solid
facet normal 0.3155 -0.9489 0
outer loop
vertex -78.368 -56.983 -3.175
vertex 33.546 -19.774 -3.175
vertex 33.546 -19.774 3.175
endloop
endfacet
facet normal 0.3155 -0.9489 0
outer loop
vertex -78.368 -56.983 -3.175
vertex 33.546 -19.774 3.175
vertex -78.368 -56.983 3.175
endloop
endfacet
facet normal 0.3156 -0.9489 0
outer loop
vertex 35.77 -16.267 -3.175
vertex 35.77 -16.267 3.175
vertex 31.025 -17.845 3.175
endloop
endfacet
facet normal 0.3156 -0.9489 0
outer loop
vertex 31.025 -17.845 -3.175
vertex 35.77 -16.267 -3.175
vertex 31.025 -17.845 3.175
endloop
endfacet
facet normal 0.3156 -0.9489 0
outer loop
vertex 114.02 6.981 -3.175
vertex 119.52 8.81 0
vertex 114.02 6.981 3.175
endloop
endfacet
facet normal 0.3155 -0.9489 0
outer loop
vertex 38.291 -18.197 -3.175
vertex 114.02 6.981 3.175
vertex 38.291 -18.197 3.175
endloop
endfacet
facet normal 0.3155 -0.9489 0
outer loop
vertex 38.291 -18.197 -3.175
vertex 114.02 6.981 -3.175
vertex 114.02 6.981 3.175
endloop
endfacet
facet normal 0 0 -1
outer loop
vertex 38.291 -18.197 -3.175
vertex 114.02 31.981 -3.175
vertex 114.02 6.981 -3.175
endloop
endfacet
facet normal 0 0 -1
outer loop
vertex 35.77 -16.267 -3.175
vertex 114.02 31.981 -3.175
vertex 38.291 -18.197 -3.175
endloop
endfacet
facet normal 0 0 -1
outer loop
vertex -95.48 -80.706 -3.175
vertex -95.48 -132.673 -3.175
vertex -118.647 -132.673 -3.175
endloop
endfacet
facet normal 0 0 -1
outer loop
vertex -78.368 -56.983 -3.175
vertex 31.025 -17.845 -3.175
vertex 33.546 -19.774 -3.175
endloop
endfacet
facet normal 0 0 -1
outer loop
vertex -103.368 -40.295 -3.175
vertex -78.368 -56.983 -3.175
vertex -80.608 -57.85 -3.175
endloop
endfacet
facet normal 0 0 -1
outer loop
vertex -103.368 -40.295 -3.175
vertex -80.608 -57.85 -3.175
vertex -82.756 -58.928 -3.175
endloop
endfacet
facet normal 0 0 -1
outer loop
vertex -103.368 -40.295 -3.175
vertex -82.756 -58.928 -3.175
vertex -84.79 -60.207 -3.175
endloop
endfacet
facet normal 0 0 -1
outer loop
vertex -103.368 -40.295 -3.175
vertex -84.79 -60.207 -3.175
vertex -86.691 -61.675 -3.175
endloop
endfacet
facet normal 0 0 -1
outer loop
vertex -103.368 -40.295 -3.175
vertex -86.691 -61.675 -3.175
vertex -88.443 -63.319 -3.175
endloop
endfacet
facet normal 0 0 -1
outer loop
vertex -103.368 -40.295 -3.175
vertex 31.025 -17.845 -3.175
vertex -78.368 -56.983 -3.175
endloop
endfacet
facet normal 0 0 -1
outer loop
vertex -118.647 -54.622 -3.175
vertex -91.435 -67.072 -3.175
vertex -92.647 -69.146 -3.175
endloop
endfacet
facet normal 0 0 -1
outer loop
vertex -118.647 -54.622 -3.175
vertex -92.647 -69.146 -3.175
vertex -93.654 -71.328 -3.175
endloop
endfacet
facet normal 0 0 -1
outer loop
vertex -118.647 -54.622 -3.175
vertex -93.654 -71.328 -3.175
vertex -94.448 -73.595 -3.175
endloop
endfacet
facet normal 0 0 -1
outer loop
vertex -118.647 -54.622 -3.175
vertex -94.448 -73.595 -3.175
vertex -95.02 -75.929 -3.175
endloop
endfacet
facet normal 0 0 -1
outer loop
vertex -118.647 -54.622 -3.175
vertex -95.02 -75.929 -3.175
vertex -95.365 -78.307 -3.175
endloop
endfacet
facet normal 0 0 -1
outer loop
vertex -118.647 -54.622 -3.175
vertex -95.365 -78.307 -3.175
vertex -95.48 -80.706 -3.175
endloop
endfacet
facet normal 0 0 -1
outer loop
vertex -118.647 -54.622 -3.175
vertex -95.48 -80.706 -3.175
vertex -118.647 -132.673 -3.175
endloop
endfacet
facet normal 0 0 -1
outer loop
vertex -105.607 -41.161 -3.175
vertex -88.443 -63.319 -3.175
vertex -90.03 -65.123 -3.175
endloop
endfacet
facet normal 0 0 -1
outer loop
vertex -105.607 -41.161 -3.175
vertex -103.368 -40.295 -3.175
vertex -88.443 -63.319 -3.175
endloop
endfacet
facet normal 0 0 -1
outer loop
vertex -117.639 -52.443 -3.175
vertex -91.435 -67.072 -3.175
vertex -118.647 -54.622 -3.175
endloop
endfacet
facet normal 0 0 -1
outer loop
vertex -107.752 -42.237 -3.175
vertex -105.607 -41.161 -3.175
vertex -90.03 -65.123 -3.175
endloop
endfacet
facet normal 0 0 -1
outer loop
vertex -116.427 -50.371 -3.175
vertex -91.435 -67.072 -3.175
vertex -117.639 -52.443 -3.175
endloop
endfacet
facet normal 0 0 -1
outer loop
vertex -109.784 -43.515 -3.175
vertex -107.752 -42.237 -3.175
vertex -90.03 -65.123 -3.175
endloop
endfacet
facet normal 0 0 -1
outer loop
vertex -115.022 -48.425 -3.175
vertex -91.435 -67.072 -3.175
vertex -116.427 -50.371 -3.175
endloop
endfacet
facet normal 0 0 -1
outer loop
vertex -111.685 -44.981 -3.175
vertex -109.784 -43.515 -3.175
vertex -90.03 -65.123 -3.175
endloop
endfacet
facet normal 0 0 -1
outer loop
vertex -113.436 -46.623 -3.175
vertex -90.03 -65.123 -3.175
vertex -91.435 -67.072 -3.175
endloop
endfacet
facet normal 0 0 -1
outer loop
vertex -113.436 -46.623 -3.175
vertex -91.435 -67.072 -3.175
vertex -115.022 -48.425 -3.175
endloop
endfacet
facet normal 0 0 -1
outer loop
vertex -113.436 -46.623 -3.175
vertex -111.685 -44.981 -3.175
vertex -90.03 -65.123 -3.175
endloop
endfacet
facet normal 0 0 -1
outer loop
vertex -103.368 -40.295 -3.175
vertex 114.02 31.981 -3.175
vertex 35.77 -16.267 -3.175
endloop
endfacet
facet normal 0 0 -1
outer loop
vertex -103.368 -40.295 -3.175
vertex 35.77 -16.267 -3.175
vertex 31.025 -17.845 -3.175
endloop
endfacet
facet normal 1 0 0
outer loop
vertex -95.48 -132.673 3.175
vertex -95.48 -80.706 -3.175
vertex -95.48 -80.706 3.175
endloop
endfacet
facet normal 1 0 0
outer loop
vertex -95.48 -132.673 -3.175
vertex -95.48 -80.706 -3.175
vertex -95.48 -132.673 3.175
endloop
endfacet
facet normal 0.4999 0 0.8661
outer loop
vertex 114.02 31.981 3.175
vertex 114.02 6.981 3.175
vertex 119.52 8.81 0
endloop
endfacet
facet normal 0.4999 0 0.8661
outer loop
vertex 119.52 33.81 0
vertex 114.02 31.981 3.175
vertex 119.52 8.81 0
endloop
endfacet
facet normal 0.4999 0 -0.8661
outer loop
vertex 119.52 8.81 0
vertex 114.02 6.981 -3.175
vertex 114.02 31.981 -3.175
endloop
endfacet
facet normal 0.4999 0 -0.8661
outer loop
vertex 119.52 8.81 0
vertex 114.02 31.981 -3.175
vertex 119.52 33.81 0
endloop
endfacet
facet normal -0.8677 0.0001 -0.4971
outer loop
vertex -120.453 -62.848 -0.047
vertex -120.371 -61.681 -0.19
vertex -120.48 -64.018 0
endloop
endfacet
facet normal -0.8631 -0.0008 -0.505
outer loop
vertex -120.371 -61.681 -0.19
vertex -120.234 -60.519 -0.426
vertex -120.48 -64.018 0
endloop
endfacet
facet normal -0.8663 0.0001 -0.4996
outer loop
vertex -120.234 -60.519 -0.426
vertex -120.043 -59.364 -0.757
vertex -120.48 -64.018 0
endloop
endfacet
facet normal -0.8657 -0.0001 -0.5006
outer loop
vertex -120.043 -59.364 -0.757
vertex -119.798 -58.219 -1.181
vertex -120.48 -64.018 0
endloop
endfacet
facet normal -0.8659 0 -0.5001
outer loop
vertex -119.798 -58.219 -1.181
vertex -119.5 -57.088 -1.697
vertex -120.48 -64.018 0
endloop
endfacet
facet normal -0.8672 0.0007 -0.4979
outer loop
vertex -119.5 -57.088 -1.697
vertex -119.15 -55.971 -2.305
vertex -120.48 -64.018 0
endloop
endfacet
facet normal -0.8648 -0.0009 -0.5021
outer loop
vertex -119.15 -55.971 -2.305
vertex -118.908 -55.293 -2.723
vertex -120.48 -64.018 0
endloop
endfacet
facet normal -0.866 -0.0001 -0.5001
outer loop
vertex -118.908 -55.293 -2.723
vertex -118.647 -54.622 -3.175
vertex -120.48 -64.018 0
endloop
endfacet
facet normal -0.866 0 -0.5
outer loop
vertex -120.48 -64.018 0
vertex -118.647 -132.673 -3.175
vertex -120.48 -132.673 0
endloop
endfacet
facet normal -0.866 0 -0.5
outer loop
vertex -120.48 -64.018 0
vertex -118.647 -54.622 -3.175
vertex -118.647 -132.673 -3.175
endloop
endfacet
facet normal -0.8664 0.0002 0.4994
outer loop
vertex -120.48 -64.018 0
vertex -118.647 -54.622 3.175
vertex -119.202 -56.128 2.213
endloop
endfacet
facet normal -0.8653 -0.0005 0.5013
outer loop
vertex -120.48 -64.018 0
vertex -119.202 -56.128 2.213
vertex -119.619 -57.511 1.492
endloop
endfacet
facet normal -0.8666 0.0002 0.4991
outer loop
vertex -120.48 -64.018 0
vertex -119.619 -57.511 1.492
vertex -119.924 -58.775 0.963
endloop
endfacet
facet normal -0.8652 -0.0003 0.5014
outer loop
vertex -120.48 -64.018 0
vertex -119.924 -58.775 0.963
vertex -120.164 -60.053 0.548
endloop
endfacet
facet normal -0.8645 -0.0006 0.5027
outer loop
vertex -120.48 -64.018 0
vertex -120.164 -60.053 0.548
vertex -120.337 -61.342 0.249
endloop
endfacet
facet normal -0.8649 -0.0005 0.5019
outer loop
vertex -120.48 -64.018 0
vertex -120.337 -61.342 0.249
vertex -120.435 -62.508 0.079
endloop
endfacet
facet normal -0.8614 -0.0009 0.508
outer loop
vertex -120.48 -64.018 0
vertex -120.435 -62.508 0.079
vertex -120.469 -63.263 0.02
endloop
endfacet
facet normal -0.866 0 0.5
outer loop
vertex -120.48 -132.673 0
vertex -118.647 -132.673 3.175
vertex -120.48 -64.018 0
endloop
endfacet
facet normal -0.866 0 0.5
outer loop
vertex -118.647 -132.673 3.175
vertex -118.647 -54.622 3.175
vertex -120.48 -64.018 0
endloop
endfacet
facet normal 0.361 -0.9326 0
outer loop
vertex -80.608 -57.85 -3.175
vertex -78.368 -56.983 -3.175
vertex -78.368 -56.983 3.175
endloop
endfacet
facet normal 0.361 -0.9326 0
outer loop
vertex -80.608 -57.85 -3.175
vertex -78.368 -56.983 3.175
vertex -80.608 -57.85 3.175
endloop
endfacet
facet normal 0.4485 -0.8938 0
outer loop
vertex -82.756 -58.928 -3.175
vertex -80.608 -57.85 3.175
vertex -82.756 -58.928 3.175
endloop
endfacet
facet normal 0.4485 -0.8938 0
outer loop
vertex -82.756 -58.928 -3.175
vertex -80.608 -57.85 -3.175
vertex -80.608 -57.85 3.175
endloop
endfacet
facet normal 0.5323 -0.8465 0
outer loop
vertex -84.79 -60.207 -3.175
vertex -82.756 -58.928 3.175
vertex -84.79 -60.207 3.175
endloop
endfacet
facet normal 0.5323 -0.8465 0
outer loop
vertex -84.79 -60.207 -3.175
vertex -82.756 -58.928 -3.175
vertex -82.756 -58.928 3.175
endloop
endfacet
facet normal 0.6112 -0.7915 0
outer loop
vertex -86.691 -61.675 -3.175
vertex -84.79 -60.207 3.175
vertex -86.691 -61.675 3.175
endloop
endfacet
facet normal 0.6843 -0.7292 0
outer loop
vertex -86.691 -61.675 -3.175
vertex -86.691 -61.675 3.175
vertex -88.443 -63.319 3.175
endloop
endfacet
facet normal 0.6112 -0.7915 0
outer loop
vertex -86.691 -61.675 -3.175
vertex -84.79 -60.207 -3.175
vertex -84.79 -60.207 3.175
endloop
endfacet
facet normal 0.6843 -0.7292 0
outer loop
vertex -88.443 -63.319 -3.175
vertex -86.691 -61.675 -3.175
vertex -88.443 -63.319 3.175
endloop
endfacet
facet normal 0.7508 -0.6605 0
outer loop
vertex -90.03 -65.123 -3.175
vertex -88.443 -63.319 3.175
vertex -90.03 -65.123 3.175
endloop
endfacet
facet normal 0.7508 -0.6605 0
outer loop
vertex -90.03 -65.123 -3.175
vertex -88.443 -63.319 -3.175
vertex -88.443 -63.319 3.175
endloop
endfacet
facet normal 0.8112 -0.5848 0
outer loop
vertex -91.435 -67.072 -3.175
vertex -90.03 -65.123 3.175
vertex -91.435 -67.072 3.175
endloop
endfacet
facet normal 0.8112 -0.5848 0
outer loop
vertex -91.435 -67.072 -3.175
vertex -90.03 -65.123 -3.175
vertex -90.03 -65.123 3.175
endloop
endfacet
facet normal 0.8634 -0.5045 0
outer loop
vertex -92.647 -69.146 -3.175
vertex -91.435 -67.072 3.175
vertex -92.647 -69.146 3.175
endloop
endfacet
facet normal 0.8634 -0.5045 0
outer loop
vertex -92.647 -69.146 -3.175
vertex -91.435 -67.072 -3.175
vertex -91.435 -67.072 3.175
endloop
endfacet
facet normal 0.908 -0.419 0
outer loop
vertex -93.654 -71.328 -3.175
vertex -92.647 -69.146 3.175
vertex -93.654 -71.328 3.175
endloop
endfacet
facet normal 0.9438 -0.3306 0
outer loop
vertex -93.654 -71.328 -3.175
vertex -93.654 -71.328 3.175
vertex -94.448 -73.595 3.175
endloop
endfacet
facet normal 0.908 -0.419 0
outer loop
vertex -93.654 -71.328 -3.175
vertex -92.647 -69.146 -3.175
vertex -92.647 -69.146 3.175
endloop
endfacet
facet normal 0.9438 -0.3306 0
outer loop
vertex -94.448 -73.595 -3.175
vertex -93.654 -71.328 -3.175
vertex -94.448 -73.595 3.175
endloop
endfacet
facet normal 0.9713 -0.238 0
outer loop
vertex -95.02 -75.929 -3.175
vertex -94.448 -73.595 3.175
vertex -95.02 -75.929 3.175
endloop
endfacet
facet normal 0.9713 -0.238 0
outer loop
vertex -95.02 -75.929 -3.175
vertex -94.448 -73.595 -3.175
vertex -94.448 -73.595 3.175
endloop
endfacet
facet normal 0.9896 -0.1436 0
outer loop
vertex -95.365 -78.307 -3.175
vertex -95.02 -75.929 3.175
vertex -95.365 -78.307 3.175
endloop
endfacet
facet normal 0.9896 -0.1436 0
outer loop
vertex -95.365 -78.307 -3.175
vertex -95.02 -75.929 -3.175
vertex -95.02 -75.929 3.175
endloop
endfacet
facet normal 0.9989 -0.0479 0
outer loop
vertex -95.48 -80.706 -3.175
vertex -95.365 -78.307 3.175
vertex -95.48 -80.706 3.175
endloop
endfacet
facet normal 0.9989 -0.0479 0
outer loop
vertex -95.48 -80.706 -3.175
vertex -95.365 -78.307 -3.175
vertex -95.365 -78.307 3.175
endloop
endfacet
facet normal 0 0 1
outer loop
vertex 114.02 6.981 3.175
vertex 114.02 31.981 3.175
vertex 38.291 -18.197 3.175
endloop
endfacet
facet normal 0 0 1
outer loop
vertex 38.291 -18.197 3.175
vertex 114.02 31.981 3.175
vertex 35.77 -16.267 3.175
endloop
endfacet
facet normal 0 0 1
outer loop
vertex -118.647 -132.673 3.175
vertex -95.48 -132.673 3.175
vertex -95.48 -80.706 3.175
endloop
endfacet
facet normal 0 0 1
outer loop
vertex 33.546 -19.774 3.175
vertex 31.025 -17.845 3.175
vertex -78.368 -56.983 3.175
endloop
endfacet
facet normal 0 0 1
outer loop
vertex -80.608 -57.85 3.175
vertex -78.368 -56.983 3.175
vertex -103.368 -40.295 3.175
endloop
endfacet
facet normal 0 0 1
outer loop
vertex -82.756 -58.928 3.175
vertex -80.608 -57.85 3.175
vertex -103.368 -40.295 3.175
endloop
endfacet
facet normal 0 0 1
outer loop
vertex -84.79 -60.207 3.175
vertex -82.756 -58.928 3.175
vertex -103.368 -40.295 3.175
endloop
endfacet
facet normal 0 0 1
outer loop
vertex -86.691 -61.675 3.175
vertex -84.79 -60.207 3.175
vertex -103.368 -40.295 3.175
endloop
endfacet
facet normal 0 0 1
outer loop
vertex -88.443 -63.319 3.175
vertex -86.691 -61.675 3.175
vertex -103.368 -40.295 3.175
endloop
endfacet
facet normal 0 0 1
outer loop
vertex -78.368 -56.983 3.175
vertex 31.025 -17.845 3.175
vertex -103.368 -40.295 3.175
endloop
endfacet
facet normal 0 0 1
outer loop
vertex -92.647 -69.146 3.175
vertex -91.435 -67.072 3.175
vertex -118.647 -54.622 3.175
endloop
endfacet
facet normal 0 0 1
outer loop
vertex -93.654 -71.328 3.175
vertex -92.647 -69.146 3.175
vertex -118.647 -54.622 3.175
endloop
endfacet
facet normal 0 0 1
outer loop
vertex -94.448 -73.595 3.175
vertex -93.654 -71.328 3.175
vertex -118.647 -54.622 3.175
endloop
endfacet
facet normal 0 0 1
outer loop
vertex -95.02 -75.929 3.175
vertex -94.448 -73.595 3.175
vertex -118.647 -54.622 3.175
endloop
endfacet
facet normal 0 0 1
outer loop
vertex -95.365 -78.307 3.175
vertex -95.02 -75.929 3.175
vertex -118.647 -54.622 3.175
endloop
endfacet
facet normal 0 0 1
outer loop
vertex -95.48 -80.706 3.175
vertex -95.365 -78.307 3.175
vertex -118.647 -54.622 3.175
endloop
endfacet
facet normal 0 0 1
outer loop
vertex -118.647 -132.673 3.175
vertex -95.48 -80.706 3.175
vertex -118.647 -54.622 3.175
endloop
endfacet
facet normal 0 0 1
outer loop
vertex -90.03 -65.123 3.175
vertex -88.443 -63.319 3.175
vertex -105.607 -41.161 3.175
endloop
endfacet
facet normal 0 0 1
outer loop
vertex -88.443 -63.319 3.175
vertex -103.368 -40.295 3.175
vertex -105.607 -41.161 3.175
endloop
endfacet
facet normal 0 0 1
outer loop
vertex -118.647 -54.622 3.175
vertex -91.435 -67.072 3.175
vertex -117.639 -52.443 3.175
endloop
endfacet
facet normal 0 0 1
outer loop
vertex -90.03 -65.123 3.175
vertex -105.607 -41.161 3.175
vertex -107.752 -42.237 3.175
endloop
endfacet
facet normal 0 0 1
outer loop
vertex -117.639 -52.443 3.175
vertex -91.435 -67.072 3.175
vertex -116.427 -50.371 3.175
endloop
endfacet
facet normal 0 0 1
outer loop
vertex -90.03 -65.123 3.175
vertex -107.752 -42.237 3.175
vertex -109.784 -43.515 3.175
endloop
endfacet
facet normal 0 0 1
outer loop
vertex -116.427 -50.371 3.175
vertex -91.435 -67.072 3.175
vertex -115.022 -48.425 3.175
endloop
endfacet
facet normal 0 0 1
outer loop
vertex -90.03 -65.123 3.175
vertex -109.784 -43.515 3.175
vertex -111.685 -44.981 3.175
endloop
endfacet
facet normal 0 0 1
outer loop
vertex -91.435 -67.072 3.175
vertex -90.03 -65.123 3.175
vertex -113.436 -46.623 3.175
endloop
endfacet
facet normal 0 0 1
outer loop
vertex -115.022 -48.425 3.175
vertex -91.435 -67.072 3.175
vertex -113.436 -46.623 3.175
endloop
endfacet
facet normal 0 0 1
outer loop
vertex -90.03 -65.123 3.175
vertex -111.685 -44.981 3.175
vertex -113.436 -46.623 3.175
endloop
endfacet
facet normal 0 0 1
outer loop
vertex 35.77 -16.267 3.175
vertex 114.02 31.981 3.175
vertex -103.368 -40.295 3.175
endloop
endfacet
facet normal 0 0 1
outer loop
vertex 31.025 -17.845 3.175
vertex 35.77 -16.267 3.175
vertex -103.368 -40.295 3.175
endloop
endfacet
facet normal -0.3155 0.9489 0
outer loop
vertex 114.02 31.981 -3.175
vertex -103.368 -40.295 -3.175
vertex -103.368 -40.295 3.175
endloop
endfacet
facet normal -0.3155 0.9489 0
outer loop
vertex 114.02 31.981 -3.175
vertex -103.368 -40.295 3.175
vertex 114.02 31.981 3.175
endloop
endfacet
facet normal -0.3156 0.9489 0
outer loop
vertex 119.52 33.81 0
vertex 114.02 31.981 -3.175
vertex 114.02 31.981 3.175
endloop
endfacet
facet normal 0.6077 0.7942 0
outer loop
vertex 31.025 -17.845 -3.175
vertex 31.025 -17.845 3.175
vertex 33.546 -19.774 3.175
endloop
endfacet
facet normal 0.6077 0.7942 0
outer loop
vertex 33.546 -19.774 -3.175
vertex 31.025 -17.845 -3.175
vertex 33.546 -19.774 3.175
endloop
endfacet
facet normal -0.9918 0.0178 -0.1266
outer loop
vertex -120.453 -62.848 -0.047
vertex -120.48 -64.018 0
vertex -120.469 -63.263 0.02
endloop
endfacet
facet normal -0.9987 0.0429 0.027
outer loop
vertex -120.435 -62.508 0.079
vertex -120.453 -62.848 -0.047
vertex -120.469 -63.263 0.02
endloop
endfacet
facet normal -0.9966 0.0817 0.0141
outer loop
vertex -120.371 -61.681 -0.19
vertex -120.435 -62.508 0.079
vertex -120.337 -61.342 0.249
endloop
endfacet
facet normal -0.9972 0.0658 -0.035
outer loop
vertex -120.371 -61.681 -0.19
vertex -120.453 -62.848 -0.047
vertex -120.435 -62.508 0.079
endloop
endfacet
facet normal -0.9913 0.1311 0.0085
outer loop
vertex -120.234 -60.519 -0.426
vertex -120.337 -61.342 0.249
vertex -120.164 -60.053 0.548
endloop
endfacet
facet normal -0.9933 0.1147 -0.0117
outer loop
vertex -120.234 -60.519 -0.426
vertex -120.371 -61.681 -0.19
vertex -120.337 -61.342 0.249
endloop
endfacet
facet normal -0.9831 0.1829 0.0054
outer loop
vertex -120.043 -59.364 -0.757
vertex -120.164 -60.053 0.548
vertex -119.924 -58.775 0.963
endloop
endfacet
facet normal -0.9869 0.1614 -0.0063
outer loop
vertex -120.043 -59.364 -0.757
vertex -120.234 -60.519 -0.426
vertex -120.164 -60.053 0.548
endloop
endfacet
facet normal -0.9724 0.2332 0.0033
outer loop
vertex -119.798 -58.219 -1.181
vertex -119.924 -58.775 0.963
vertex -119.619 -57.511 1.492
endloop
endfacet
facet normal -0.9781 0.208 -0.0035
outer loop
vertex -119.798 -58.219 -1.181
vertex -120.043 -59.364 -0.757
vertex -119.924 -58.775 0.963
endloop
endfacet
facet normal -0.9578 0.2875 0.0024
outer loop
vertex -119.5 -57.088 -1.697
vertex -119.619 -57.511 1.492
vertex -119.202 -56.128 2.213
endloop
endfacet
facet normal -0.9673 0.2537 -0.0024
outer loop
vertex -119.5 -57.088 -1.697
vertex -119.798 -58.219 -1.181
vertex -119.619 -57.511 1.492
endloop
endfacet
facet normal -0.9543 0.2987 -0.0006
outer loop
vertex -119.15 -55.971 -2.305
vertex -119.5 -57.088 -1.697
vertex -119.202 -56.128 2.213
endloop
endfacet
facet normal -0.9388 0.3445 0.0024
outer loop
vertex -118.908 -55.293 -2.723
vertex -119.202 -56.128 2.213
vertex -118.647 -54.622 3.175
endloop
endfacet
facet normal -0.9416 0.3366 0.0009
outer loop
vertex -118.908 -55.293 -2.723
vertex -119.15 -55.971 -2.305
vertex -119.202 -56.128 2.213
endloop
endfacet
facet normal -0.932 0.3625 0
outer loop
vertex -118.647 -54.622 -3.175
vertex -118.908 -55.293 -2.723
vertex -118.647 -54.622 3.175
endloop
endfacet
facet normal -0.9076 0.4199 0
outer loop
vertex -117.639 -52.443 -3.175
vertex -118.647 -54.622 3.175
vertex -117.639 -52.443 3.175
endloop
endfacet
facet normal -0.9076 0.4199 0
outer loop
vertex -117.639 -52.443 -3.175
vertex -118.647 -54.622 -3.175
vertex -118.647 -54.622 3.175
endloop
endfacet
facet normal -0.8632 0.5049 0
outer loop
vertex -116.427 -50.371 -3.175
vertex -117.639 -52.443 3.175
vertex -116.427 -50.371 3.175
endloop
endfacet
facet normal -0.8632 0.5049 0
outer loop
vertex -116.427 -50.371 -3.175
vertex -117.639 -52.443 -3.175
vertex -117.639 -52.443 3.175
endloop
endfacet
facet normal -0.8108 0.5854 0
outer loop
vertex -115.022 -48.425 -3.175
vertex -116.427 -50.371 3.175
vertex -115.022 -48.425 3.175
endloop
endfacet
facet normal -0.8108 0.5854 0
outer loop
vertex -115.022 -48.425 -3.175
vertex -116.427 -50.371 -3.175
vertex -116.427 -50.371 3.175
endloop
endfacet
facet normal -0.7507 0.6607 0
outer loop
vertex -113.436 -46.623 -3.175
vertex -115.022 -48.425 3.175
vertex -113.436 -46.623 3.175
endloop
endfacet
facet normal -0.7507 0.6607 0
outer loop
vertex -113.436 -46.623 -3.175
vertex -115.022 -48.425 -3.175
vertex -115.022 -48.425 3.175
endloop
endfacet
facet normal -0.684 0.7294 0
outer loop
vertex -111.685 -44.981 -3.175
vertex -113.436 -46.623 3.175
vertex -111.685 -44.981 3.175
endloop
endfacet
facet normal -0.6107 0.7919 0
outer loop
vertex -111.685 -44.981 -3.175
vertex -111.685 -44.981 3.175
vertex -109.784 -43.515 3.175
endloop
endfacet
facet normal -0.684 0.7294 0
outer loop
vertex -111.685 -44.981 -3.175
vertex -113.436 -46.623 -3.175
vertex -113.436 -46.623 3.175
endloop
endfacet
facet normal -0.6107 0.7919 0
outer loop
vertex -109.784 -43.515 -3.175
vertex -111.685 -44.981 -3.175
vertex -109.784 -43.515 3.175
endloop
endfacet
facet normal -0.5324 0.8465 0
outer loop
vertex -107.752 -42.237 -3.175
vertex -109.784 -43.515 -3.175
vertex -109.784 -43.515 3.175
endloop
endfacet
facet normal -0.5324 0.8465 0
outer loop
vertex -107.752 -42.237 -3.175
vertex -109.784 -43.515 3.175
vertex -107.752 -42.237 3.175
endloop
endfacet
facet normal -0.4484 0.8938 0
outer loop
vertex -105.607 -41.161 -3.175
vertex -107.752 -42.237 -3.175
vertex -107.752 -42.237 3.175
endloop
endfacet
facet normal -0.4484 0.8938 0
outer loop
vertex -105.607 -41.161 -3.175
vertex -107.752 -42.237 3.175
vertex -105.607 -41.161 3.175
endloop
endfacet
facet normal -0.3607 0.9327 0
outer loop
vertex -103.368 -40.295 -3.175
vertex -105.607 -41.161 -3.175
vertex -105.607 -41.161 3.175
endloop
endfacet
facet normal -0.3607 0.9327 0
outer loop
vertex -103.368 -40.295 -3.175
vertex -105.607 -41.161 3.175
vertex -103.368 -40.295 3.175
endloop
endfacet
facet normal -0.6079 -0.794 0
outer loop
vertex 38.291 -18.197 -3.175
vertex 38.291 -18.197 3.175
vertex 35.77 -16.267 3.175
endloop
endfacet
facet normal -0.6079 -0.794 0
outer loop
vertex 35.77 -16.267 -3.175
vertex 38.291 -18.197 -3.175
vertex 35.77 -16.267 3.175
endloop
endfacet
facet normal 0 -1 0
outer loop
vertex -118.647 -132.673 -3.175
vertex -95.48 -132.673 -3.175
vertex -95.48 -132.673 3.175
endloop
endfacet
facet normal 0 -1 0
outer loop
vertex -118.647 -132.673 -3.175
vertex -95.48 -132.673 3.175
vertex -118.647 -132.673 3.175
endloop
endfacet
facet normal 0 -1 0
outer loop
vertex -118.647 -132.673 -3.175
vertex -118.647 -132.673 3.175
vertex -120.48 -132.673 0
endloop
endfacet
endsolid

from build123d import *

# Parameters (mm, degrees)
BOSS_EXTRUDE1_DEPTH      = 3.175
BOSS_EXTRUDE1_DEPTH_BACK = 3.175
CUT_EXTRUDE3_DEPTH       = 206.528461822
CUT_EXTRUDE5_DEPTH       = 206.528461822
CUT_EXTRUDE6_DEPTH       = 6.35


with BuildPart() as part:
    # Sketch1 → Boss-Extrude1 (new, two sides: drawn at the far end of the back side and taken through both)
    with BuildSketch(Plane.XY.offset(-BOSS_EXTRUDE1_DEPTH_BACK)):
        with BuildLine():
            Line((-95.480291898, -80.706386575), (-95.480291898, -131.085242165))
            Line((-95.480291898, -131.085242165), (-95.480291898, -132.672742165))
            Line((-95.480291898, -132.672742165), (-120.480291898, -132.672742165))
            Line((-120.480291898, -132.672742165), (-120.480291898, -131.085242165))
            Line((-120.480291898, -131.085242165), (-120.480291898, -64.018285781))
            ThreePointArc((-120.480291898, -64.018285781), (-115.755703828, -49.392703021), (-103.367678212, -40.295108567))
            Line((-103.367678212, -40.295108567), (119.519708102, 33.809591006))
            Line((119.519708102, 33.809591006), (119.519708102, 8.809591006))
            Line((119.519708102, 8.809591006), (-78.367678212, -56.983209361))
            ThreePointArc((-78.367678212, -56.983209361), (-90.755703828, -66.080803815), (-95.480291898, -80.706386575))
        make_face()
    extrude(amount=BOSS_EXTRUDE1_DEPTH + BOSS_EXTRUDE1_DEPTH_BACK)

    # Sketch2 → Cut-Extrude3 (cut, through all)
    with BuildSketch(Plane.XZ.offset(132.672742165)):
        Polygon((-120.480291898, 0), (-120.480291898, 3.175), (-118.647204793, 3.175), align=None)
    cut_extrude3 = extrude(amount=-CUT_EXTRUDE3_DEPTH, mode=Mode.SUBTRACT)

    # Mirror3: Cut-Extrude3 across plane
    add(cut_extrude3.mirror(Plane.XY), mode=Mode.SUBTRACT)

    # Sketch3 → Cut-Extrude5 (cut, through all)
    with BuildSketch(Plane.XZ.offset(132.672742165)):
        Polygon((119.519708102, 3.175), (114.020446788, 3.175), (119.519708102, 0), align=None)
    cut_extrude5 = extrude(amount=-CUT_EXTRUDE5_DEPTH, mode=Mode.SUBTRACT)

    # Mirror4: Cut-Extrude5 across plane
    add(cut_extrude5.mirror(Plane.XY), mode=Mode.SUBTRACT)

    # Sketch6 → Cut-Extrude6 (cut)
    with BuildSketch(Plane.XY.offset(3.175)):
        Polygon((33.546459297, -19.774448133), (38.29109474, -18.19697087), (35.769730347, -16.267373348), (31.025094904, -17.844850611), align=None)
    extrude(amount=-CUT_EXTRUDE6_DEPTH, mode=Mode.SUBTRACT)


solid = part.part
